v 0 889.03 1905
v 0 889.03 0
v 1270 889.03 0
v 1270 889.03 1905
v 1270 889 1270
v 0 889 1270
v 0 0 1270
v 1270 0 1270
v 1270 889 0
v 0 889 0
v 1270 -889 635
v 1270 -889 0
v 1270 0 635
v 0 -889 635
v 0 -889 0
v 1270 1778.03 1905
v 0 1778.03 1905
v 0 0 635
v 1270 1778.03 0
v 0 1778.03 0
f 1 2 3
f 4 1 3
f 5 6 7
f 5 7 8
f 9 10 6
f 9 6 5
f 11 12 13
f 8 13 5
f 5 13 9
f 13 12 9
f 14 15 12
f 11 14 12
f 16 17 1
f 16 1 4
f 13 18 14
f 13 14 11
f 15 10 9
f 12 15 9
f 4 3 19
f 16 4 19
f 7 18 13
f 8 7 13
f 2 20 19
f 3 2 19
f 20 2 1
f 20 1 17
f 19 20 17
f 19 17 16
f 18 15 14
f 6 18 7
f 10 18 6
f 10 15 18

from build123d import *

# Parameters (mm, degrees)
F0_W     = 1270
F0_H     = 889
F3_DEPTH = 635
F1_W     = 1270
F1_H     = 889
F4_DEPTH = 1270
F2_W     = 1270
F2_H     = 889
F5_DEPTH = 1905


with BuildPart() as f3:
    # F0 (on Top) → F3 (new body)
    with BuildSketch(Plane.XY):
        with Locations((635, -444.5)):
            Rectangle(F0_W, F0_H)
    extrude(amount=F3_DEPTH)

    # F1 (on face) → F4 (join)
    with BuildSketch(Plane.XY):
        with Locations((635, 444.5)):
            Rectangle(F1_W, F1_H)
    extrude(amount=F4_DEPTH)


with BuildPart() as f5:
    # F2 (on face) → F5 (new body)
    with BuildSketch(Plane.XY):
        with Locations((635, 1333.529622)):
            Rectangle(F2_W, F2_H)
    extrude(amount=F5_DEPTH)


solid = Compound([f3.part, f5.part])
